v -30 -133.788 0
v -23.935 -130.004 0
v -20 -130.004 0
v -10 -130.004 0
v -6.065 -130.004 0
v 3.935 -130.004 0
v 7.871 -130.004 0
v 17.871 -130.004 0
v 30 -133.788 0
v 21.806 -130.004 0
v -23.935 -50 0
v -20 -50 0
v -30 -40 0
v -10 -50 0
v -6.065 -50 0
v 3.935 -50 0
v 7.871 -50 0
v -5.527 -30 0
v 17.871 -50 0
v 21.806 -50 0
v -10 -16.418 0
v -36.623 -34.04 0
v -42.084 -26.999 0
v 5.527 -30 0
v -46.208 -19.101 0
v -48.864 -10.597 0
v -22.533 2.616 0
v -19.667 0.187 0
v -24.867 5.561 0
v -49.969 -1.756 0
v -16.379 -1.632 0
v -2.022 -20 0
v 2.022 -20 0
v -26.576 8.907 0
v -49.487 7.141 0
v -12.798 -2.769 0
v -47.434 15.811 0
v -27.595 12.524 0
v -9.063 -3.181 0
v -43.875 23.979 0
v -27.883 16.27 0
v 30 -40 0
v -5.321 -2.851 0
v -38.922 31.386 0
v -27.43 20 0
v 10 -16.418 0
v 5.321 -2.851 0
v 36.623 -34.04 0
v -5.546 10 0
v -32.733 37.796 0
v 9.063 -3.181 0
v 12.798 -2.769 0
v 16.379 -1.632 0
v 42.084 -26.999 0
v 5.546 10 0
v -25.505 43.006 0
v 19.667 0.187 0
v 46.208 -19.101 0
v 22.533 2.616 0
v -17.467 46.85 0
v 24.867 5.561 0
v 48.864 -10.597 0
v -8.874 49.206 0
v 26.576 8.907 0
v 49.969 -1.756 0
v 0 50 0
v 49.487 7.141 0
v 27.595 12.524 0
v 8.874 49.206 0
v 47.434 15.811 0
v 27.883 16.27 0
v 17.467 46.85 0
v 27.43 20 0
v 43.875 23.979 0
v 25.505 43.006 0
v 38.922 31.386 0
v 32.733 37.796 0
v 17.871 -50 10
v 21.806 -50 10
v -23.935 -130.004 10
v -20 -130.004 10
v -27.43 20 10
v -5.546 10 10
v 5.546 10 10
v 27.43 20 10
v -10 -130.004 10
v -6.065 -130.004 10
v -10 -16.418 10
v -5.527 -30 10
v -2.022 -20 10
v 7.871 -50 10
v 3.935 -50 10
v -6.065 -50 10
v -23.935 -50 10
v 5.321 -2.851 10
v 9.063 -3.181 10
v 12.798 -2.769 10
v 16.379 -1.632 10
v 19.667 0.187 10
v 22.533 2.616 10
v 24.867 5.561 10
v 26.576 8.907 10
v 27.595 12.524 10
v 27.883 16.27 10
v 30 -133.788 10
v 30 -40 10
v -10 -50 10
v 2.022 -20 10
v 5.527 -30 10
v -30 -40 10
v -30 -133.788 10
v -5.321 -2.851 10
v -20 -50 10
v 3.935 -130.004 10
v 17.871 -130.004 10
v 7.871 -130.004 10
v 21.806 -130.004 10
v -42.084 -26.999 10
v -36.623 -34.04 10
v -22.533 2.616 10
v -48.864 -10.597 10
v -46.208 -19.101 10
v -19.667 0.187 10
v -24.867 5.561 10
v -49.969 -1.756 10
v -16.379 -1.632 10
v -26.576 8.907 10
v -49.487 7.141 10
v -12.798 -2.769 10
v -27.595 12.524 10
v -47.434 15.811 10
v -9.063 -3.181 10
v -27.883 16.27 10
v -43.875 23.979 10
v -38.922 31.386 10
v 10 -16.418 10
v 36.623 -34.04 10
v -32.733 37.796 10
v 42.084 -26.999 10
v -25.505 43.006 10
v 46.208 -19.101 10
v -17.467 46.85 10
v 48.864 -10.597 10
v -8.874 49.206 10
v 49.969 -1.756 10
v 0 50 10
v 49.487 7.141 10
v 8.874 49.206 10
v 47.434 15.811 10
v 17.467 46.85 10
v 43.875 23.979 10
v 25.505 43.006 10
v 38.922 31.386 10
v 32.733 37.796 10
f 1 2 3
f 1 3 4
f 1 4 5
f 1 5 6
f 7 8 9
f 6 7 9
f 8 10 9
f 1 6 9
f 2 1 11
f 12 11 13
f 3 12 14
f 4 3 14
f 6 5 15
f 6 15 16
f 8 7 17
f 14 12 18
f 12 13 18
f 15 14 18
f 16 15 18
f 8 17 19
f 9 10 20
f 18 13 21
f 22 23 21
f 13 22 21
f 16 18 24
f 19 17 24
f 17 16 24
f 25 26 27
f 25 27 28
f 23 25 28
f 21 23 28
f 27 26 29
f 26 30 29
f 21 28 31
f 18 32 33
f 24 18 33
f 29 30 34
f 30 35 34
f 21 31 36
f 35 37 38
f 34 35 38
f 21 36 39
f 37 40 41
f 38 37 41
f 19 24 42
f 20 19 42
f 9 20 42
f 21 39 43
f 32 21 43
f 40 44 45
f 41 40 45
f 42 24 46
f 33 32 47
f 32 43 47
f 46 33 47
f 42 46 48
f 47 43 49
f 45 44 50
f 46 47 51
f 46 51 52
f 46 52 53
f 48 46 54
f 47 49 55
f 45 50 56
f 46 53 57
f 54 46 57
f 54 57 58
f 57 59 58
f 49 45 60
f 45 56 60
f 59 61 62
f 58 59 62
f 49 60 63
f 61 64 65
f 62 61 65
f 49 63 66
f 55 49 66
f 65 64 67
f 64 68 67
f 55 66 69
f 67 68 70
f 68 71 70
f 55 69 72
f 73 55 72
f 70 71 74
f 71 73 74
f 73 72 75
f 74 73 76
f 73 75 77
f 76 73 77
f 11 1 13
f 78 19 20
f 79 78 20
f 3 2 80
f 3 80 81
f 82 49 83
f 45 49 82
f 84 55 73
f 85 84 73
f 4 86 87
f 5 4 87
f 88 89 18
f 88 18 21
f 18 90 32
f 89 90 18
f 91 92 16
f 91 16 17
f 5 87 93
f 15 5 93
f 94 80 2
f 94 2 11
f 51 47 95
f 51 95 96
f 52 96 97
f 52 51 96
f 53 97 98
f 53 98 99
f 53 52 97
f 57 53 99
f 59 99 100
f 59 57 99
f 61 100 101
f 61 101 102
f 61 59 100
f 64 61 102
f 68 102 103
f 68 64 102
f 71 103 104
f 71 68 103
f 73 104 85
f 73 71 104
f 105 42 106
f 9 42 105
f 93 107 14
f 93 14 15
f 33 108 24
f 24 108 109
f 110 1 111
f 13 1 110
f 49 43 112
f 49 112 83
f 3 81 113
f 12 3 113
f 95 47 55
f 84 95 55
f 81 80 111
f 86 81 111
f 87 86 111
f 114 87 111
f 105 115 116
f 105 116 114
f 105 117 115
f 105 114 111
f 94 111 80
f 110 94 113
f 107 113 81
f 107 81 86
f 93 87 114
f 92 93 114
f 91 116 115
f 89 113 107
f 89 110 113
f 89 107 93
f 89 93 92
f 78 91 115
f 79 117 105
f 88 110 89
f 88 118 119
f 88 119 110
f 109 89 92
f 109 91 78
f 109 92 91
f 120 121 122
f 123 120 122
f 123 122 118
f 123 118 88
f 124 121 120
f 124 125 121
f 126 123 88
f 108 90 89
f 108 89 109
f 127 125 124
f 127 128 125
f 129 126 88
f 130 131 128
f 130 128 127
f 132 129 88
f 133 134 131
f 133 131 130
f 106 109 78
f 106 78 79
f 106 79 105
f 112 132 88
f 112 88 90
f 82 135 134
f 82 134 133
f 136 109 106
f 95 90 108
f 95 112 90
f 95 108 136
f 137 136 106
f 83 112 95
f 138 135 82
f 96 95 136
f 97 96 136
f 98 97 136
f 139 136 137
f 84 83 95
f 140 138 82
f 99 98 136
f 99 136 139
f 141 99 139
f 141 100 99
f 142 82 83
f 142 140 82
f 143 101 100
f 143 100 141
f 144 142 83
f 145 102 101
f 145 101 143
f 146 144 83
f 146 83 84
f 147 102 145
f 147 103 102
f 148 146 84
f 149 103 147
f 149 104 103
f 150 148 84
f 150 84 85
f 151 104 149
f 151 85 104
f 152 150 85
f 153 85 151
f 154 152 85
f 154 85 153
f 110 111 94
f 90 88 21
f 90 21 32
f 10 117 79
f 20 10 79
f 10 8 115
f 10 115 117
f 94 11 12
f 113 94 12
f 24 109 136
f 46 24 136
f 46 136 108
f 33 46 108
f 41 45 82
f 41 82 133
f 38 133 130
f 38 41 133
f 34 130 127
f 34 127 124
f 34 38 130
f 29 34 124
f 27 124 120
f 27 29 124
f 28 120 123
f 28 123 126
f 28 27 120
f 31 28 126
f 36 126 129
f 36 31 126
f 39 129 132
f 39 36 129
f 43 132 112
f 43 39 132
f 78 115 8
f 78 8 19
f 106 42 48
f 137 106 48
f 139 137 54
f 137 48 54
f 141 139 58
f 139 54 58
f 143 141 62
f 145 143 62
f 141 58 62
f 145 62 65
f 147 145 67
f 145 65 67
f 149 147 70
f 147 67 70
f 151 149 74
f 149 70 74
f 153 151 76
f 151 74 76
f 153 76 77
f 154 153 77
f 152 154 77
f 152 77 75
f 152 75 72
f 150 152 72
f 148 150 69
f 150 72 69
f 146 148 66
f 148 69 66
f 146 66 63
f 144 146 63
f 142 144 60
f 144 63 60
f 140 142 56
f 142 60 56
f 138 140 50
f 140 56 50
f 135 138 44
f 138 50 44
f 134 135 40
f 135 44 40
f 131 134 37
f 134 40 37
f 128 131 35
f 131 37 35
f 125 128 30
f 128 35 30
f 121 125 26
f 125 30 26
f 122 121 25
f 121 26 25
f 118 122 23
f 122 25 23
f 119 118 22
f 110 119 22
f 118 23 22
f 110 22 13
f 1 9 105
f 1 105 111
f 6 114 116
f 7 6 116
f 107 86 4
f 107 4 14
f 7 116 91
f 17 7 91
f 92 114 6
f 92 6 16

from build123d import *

# Parameters (mm, degrees)
PAD_DEPTH       = 10
SKETCH001_W     = 3.935465
SKETCH001_H     = 80.004486
POCKET_DEPTH    = 10.001
POCKET001_DEPTH = 10.001


with BuildPart() as part:
    # Sketch → Pad (new body)
    with BuildSketch(Plane.XY):
        with BuildLine():
            ThreePointArc((30, -40), (0, 50), (-30, -40))
            Line((-30, -133.787827), (-30, -40))
            Line((30, -133.787827), (-30, -133.787827))
            Line((30, -40), (30, -133.787827))
        make_face()
        with BuildLine():
            Line((5.320689, -2.850805), (5.546297, 10))
            Line((5.546297, 10), (27.430071, 20))
            ThreePointArc((5.320689, -2.850805), (22.53342, 2.616363), (27.430071, 20))
        make_face(mode=Mode.SUBTRACT)
        with BuildLine():
            Line((-5.320689, -2.850805), (-5.546297, 10))
            Line((-5.546297, 10), (-27.430071, 20))
            ThreePointArc((-27.430071, 20), (-22.53342, 2.616363), (-5.320689, -2.850805))
        make_face(mode=Mode.SUBTRACT)
    extrude(amount=PAD_DEPTH)

    # Sketch001 → Pocket (cut, through all)
    with BuildSketch(Plane.XY.offset(10)):
        with Locations((-21.967733, -90.002243)):
            Rectangle(SKETCH001_W, SKETCH001_H)
        with Locations((-8.032267, -90.002243)):
            Rectangle(SKETCH001_W, SKETCH001_H)
        with Locations((5.903197, -90.002243)):
            Rectangle(SKETCH001_W, SKETCH001_H)
        with Locations((19.838662, -90.002243)):
            Rectangle(SKETCH001_W, SKETCH001_H)
    extrude(amount=-POCKET_DEPTH, mode=Mode.SUBTRACT)

    # Sketch002 → Pocket001 (cut, through all)
    with BuildSketch(Plane.XY.offset(10)):
        Polygon((-10, -16.418013), (-2.0219, -20), (-5.526516, -30), align=None)
        Polygon((10, -16.418013), (2.0219, -20), (5.526516, -30), align=None)
    extrude(amount=-POCKET001_DEPTH, mode=Mode.SUBTRACT)


solid = part.part
